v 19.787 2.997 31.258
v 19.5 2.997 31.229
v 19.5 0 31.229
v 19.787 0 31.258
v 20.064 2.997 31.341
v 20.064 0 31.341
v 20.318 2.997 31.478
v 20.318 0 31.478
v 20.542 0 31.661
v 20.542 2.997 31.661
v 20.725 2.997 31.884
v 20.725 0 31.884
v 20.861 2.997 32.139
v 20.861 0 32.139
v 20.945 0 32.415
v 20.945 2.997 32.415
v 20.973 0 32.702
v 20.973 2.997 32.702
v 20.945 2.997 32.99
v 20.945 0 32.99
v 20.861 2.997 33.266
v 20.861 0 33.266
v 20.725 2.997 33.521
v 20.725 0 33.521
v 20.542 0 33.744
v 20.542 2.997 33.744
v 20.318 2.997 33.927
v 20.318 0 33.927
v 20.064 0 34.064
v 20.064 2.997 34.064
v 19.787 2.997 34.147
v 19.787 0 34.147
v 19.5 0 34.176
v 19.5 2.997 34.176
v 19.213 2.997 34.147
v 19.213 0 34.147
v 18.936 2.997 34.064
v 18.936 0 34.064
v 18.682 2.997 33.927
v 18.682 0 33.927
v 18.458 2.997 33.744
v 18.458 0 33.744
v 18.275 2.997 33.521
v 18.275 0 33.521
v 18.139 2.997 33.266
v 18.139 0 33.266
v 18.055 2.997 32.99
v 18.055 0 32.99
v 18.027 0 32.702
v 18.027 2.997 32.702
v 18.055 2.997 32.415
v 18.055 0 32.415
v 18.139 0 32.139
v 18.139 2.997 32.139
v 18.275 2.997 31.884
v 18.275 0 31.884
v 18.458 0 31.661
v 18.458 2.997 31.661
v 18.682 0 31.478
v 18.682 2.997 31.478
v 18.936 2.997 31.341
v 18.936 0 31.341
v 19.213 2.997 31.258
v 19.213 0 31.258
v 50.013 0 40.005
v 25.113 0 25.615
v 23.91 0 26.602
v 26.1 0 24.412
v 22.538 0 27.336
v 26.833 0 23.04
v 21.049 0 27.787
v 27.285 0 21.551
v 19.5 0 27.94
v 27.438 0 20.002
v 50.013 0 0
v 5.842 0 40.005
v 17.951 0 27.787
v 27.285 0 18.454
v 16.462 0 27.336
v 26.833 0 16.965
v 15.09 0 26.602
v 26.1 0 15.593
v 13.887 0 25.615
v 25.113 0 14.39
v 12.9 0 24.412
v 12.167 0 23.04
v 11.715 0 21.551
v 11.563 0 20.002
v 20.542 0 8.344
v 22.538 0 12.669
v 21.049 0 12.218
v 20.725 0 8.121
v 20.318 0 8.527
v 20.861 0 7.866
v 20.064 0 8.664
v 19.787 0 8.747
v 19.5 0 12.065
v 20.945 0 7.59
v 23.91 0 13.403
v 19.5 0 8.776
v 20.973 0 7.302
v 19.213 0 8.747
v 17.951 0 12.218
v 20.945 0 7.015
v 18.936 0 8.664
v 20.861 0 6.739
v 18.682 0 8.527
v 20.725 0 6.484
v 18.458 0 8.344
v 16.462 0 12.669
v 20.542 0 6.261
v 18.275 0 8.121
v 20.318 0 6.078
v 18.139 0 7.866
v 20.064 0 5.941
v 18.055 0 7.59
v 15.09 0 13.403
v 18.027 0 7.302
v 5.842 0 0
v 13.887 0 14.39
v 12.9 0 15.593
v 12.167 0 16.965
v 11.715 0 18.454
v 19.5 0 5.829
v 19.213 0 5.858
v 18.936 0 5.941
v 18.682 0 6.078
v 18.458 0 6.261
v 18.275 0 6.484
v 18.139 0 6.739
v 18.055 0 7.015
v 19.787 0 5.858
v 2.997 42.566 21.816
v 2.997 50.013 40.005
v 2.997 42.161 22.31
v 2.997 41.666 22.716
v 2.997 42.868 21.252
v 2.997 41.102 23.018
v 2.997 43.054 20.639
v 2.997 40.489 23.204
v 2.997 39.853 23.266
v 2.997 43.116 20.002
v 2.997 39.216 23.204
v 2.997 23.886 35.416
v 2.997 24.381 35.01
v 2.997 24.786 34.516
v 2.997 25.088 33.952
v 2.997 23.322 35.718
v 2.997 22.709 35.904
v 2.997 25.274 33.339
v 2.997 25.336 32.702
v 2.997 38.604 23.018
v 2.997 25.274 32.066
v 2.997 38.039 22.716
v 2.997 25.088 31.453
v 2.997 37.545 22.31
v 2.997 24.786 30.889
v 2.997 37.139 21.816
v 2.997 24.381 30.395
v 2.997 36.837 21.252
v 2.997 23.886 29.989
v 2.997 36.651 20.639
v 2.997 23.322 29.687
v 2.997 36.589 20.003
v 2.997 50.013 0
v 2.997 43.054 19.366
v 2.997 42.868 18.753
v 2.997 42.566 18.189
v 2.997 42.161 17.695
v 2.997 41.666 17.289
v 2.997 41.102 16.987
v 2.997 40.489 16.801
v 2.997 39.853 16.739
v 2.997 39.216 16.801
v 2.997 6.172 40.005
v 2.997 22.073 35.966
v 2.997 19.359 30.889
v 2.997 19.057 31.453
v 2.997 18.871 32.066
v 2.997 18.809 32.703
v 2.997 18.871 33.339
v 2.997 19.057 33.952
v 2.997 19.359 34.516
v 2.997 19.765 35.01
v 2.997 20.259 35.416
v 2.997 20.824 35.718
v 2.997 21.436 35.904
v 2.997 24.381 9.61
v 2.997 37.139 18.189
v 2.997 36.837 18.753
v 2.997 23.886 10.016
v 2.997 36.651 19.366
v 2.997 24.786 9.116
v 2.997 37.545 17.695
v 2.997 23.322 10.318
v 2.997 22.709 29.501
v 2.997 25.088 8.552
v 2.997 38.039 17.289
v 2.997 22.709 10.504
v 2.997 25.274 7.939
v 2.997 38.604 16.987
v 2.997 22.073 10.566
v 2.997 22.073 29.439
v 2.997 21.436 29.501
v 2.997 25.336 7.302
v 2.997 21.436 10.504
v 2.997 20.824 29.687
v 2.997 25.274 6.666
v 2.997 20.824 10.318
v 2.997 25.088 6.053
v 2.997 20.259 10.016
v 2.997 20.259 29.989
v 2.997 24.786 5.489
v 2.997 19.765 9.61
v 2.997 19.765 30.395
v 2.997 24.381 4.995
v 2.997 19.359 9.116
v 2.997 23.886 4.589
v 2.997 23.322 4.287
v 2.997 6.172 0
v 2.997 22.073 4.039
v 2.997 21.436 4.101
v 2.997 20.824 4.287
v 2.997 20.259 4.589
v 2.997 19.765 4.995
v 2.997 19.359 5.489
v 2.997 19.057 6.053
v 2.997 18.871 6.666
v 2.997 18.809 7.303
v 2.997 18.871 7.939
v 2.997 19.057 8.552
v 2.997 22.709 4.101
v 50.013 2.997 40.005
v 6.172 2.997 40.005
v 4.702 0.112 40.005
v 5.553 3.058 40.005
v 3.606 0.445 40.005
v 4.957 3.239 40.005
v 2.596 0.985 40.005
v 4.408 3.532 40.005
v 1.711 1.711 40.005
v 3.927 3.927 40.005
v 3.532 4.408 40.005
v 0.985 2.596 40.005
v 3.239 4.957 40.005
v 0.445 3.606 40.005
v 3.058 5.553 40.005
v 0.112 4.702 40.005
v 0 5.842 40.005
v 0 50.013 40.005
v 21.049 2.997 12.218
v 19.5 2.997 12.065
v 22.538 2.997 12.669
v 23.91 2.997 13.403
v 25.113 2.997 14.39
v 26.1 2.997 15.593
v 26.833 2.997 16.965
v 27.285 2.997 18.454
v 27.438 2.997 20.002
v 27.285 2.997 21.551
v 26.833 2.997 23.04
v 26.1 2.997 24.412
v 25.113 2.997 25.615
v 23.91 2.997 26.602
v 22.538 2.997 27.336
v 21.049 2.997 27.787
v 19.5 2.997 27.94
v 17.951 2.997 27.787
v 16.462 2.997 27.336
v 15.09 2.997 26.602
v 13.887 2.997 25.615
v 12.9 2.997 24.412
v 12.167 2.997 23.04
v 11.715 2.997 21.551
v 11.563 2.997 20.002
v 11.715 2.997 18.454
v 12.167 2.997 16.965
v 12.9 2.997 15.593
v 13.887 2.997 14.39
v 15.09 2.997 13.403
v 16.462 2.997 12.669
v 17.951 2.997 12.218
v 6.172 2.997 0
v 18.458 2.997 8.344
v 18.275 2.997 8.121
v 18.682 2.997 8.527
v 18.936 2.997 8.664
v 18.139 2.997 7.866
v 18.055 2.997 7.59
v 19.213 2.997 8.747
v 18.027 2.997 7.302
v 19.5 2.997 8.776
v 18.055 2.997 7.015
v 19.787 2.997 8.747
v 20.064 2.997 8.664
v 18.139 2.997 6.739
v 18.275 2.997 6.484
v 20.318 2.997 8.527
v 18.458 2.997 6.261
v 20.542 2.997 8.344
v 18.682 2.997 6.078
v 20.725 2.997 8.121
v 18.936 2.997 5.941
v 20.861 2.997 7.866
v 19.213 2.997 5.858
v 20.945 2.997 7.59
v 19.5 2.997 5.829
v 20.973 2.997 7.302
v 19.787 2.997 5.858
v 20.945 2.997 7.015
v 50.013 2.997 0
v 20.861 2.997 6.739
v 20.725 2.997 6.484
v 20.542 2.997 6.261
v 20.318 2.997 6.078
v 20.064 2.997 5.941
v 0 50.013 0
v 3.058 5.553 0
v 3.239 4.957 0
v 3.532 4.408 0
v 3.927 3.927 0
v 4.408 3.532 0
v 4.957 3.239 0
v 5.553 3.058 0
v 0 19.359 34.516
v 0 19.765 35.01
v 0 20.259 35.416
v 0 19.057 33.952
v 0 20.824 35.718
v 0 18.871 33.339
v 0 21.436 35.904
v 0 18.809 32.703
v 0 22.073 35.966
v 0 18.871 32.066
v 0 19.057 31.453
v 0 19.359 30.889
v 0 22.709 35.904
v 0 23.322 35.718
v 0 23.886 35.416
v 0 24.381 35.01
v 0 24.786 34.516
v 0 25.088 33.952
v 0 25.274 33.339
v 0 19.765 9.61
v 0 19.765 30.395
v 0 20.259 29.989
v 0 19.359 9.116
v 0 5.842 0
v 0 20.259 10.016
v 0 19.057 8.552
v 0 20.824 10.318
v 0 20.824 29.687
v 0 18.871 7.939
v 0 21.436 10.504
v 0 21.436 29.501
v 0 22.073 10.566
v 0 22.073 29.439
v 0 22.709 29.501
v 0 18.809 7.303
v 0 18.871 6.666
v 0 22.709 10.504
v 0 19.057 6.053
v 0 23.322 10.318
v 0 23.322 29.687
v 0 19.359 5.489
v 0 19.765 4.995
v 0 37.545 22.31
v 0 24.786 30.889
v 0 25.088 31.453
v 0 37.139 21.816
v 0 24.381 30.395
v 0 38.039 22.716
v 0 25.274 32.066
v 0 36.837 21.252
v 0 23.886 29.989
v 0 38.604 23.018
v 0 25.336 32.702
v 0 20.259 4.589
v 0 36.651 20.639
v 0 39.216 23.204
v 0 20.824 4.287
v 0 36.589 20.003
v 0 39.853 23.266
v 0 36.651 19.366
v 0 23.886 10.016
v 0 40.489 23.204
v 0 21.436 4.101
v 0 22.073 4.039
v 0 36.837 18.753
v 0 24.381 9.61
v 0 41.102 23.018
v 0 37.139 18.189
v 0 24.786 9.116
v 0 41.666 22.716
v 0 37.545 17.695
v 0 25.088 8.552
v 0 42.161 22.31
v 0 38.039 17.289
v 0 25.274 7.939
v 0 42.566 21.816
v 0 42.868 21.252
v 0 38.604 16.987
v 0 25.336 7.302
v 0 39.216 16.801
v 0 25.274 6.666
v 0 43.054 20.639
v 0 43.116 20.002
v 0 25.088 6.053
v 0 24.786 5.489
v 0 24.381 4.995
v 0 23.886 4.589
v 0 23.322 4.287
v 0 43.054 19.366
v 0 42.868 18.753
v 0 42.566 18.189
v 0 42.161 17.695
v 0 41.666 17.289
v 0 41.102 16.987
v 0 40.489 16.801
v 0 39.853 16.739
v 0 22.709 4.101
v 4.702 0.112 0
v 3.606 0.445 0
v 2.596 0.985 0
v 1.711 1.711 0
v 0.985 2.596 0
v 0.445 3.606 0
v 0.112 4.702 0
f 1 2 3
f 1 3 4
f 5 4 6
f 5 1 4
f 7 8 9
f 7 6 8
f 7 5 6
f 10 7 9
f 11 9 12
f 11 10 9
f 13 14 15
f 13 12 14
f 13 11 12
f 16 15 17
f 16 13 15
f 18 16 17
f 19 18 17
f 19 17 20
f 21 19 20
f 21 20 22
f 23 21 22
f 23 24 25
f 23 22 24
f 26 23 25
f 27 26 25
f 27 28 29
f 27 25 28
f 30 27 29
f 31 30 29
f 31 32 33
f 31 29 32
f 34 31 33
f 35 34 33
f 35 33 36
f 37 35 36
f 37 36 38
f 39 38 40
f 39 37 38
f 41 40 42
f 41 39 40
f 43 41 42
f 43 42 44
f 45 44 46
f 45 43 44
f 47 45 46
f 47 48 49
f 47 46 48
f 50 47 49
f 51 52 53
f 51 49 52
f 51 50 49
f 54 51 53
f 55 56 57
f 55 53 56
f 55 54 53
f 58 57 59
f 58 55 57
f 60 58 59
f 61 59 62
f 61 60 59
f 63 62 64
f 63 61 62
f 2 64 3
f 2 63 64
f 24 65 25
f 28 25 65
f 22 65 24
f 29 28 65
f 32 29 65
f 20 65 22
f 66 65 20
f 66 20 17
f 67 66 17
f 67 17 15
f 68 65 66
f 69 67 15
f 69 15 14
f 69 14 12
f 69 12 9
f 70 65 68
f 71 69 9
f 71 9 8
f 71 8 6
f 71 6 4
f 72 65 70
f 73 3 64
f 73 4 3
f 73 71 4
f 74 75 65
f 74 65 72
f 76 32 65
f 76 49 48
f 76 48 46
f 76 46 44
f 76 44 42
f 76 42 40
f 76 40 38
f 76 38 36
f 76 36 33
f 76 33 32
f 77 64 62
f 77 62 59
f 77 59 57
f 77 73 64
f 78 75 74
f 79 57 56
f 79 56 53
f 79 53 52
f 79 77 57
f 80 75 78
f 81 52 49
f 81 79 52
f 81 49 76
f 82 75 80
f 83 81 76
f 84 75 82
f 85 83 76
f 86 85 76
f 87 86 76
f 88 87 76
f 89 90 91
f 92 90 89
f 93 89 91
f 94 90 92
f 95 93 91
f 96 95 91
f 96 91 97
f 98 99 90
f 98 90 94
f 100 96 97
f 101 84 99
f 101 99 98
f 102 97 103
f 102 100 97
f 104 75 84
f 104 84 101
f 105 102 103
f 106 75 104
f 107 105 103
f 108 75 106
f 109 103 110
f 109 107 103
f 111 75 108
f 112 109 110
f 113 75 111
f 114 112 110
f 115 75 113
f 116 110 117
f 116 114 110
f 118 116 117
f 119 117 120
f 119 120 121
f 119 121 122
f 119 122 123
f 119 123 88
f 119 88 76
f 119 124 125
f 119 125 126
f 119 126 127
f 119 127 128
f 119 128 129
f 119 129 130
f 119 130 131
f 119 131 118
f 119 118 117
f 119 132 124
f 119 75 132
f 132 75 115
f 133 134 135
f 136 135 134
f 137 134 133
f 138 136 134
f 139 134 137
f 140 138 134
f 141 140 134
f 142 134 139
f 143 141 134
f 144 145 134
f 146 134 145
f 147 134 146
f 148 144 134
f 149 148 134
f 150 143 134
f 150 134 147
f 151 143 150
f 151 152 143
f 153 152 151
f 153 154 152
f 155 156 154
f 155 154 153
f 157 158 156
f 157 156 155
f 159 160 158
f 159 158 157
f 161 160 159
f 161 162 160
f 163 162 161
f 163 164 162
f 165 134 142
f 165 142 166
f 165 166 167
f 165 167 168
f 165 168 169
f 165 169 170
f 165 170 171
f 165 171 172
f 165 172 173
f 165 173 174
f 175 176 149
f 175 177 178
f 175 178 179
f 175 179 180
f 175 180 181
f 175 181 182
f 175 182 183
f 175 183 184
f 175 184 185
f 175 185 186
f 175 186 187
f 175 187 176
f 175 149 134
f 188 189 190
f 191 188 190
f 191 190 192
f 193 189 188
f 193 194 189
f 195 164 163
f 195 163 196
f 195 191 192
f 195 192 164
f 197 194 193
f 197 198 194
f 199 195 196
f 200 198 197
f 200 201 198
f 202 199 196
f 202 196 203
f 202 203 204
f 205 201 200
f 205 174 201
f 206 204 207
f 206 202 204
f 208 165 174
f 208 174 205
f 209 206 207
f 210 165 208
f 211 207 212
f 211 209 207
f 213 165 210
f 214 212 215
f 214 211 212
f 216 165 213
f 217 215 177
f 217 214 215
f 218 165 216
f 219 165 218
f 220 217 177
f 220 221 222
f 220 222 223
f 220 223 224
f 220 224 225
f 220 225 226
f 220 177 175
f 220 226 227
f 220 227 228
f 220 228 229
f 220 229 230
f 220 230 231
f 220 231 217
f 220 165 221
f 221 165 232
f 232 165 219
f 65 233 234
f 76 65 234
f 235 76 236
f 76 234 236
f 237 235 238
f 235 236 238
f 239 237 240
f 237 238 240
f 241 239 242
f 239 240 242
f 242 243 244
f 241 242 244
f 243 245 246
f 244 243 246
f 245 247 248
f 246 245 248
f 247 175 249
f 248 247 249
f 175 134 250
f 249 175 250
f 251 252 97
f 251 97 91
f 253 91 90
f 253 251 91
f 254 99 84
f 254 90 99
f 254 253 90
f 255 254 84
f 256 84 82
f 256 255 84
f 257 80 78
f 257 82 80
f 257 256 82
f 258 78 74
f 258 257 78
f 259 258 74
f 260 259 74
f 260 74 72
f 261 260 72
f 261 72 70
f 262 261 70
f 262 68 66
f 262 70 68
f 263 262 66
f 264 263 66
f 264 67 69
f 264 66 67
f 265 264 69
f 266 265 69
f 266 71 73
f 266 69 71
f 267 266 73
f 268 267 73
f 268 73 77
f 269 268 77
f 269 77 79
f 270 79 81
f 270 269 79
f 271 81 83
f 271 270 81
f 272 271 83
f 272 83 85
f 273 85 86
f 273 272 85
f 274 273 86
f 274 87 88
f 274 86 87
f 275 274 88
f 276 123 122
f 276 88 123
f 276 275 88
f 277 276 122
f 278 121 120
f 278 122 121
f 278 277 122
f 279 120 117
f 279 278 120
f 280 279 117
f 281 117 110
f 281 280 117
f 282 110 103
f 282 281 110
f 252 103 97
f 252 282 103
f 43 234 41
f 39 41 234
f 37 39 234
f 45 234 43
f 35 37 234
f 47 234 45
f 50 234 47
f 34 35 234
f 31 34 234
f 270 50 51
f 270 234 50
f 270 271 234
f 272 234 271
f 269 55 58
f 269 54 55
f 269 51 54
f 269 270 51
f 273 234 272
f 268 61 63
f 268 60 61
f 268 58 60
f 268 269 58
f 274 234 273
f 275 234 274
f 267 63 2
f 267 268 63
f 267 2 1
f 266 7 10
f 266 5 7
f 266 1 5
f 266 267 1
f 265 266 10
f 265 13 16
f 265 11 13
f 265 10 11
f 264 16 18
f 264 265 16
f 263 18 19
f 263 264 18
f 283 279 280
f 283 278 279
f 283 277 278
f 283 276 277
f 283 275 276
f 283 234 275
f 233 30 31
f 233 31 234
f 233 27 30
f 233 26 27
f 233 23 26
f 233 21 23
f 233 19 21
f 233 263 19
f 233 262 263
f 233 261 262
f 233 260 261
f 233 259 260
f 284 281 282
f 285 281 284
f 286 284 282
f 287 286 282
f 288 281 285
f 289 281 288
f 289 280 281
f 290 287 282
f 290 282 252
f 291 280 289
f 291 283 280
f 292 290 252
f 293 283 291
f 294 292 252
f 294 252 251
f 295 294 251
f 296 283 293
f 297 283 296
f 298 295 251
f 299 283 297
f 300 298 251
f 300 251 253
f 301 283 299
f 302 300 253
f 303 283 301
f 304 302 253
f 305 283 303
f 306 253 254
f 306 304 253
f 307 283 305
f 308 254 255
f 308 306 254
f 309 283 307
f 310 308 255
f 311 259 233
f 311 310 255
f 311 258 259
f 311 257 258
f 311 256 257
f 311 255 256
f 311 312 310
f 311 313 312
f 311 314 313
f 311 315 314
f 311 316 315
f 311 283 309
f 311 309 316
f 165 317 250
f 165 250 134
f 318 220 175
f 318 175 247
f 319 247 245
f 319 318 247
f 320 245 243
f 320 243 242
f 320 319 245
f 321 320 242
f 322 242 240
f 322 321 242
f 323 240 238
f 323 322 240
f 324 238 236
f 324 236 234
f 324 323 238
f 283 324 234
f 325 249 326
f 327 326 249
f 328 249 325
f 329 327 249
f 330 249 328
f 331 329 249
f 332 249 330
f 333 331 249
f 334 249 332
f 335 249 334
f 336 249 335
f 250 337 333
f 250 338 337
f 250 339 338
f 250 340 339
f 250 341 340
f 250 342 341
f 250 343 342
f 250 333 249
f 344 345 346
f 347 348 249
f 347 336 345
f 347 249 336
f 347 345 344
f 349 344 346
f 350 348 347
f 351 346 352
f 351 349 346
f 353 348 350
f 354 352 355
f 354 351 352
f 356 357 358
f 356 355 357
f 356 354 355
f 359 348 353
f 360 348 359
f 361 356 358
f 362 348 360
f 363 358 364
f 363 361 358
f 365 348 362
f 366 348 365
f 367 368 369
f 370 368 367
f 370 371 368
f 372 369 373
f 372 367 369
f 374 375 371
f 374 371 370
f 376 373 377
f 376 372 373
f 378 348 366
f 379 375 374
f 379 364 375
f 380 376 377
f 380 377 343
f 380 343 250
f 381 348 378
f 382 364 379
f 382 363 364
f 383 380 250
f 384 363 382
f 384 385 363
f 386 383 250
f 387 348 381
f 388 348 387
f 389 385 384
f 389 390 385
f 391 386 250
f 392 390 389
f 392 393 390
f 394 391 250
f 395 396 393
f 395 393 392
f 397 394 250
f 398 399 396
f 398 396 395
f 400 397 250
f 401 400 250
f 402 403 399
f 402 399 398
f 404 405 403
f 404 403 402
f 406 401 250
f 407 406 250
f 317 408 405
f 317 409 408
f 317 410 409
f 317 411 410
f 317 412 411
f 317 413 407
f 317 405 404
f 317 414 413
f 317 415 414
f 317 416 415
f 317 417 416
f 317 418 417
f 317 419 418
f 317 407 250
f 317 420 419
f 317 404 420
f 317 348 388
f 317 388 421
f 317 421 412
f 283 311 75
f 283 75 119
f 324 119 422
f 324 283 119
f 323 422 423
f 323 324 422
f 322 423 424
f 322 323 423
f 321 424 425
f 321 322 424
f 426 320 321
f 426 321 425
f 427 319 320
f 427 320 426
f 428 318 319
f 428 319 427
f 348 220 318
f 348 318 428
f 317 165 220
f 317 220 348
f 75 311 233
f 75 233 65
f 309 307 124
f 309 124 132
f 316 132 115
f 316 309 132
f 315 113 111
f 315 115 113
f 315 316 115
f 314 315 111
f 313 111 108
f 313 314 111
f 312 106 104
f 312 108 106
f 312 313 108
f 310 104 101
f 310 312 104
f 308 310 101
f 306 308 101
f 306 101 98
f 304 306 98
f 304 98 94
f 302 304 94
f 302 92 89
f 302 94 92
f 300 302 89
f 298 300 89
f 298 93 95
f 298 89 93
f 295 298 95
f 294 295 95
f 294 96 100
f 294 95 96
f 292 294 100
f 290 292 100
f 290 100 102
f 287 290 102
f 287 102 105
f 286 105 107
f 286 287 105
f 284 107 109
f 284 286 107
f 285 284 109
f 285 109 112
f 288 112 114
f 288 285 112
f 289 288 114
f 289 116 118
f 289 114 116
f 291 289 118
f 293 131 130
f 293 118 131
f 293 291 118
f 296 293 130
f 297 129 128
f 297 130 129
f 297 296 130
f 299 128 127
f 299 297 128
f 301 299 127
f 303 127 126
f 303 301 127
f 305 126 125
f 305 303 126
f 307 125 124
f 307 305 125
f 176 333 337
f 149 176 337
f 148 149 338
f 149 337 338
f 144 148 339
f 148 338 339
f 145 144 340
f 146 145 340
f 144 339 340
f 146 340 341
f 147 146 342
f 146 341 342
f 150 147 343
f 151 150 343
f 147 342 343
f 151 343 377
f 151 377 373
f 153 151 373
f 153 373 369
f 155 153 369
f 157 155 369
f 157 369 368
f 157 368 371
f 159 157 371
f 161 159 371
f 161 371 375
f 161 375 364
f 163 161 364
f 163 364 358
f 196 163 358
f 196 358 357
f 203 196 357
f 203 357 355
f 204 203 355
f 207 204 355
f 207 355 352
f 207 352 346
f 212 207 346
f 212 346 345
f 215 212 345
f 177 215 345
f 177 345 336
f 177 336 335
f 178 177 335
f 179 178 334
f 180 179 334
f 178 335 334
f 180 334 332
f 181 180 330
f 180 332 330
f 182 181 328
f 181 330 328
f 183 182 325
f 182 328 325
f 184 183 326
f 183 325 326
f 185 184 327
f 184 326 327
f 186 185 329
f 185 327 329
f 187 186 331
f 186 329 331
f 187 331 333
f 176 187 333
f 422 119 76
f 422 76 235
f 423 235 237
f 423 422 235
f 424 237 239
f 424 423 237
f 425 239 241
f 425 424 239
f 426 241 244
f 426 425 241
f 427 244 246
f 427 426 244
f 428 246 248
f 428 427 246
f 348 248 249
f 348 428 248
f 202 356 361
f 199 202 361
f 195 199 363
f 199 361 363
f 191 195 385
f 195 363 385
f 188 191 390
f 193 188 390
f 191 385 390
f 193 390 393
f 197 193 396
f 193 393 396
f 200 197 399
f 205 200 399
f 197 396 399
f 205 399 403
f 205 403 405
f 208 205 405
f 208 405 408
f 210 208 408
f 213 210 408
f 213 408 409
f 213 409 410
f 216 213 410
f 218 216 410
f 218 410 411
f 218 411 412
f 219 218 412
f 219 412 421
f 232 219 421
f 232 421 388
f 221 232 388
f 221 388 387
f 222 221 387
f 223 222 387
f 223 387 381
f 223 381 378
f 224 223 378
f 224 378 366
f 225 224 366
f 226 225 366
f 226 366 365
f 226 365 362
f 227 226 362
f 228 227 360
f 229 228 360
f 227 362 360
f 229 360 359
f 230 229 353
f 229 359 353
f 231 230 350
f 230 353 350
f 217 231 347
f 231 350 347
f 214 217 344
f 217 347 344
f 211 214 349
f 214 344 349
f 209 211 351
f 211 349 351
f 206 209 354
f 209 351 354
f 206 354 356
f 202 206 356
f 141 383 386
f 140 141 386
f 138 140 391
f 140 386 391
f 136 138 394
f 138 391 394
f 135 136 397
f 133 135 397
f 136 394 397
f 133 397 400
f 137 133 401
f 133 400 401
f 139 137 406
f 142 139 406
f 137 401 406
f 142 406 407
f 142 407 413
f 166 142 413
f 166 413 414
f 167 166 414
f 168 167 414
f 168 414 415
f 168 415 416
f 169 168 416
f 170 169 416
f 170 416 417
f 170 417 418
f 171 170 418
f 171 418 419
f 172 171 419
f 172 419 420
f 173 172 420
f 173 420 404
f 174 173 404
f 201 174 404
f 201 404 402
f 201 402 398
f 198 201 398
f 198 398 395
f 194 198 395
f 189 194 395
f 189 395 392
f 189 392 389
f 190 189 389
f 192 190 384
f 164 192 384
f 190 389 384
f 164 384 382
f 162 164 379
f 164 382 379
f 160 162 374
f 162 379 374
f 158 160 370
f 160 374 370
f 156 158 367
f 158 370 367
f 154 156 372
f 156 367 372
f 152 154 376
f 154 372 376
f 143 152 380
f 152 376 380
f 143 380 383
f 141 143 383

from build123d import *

# Parameters (mm, degrees)
BOSS_EXTRUDE1_DEPTH                = 40.005
F_4_40_FOR_NUT_VERTICAL_DEPTH      = 82.258355524
F_4_40_FOR_NUT_VERTICAL_DEPTH_BACK = 82.258355524
SKETCH3_R                          = 1.4732
SKETCH3_R_2                        = 7.9375
SKETCH4_R                          = 3.2639
F_1_4_20_MOUNTING_DEPTH            = 82.258355524


with BuildPart() as part:
    # Sketch2 → Boss-Extrude1 (new body)
    with BuildSketch(Plane.XY):
        with BuildLine():
            Line((0, 5.842), (0, 50.0126))
            Line((0, 50.0126), (2.9972, 50.0126))
            Line((2.9972, 50.0126), (2.9972, 6.1722))
            ThreePointArc((2.9972, 6.1722), (3.92713597, 3.92713597), (6.1722, 2.9972))
            Line((6.1722, 2.9972), (50.0126, 2.9972))
            Line((50.0126, 2.9972), (50.0126, 0))
            Line((50.0126, 0), (5.842, 0))
            ThreePointArc((5.842, 0), (1.711082184, 1.711082184), (0, 5.842))
        make_face()
    extrude(amount=BOSS_EXTRUDE1_DEPTH)

    # Sketch3 → 4-40 For Nut Vertical (cut, two sides: drawn at the far end of the back side and taken through both)
    with BuildSketch(Plane.XZ.offset(-F_4_40_FOR_NUT_VERTICAL_DEPTH_BACK)):
        with Locations(Location((19.500000116, 32.7025, 0), (0, 0, 270))):
            Circle(SKETCH3_R)
        with Locations(Location((19.500000116, 7.3025, 0), (0, 0, 270))):
            Circle(SKETCH3_R)
        with Locations(Location((19.500000116, 20.0025, 0), (0, 0, 270))):
            Circle(SKETCH3_R_2)
    extrude(amount=F_4_40_FOR_NUT_VERTICAL_DEPTH + F_4_40_FOR_NUT_VERTICAL_DEPTH_BACK, mode=Mode.SUBTRACT)

    # Sketch4 → 1/4-20 Mounting (cut, through all)
    with BuildSketch(Plane.ZY):
        with Locations((7.3025, 22.0726)):
            Circle(SKETCH4_R)
        with Locations((32.7025, 22.0726)):
            Circle(SKETCH4_R)
        with Locations((20.0025, 39.8526)):
            Circle(SKETCH4_R)
    extrude(amount=-F_1_4_20_MOUNTING_DEPTH, mode=Mode.SUBTRACT)


solid = part.part
